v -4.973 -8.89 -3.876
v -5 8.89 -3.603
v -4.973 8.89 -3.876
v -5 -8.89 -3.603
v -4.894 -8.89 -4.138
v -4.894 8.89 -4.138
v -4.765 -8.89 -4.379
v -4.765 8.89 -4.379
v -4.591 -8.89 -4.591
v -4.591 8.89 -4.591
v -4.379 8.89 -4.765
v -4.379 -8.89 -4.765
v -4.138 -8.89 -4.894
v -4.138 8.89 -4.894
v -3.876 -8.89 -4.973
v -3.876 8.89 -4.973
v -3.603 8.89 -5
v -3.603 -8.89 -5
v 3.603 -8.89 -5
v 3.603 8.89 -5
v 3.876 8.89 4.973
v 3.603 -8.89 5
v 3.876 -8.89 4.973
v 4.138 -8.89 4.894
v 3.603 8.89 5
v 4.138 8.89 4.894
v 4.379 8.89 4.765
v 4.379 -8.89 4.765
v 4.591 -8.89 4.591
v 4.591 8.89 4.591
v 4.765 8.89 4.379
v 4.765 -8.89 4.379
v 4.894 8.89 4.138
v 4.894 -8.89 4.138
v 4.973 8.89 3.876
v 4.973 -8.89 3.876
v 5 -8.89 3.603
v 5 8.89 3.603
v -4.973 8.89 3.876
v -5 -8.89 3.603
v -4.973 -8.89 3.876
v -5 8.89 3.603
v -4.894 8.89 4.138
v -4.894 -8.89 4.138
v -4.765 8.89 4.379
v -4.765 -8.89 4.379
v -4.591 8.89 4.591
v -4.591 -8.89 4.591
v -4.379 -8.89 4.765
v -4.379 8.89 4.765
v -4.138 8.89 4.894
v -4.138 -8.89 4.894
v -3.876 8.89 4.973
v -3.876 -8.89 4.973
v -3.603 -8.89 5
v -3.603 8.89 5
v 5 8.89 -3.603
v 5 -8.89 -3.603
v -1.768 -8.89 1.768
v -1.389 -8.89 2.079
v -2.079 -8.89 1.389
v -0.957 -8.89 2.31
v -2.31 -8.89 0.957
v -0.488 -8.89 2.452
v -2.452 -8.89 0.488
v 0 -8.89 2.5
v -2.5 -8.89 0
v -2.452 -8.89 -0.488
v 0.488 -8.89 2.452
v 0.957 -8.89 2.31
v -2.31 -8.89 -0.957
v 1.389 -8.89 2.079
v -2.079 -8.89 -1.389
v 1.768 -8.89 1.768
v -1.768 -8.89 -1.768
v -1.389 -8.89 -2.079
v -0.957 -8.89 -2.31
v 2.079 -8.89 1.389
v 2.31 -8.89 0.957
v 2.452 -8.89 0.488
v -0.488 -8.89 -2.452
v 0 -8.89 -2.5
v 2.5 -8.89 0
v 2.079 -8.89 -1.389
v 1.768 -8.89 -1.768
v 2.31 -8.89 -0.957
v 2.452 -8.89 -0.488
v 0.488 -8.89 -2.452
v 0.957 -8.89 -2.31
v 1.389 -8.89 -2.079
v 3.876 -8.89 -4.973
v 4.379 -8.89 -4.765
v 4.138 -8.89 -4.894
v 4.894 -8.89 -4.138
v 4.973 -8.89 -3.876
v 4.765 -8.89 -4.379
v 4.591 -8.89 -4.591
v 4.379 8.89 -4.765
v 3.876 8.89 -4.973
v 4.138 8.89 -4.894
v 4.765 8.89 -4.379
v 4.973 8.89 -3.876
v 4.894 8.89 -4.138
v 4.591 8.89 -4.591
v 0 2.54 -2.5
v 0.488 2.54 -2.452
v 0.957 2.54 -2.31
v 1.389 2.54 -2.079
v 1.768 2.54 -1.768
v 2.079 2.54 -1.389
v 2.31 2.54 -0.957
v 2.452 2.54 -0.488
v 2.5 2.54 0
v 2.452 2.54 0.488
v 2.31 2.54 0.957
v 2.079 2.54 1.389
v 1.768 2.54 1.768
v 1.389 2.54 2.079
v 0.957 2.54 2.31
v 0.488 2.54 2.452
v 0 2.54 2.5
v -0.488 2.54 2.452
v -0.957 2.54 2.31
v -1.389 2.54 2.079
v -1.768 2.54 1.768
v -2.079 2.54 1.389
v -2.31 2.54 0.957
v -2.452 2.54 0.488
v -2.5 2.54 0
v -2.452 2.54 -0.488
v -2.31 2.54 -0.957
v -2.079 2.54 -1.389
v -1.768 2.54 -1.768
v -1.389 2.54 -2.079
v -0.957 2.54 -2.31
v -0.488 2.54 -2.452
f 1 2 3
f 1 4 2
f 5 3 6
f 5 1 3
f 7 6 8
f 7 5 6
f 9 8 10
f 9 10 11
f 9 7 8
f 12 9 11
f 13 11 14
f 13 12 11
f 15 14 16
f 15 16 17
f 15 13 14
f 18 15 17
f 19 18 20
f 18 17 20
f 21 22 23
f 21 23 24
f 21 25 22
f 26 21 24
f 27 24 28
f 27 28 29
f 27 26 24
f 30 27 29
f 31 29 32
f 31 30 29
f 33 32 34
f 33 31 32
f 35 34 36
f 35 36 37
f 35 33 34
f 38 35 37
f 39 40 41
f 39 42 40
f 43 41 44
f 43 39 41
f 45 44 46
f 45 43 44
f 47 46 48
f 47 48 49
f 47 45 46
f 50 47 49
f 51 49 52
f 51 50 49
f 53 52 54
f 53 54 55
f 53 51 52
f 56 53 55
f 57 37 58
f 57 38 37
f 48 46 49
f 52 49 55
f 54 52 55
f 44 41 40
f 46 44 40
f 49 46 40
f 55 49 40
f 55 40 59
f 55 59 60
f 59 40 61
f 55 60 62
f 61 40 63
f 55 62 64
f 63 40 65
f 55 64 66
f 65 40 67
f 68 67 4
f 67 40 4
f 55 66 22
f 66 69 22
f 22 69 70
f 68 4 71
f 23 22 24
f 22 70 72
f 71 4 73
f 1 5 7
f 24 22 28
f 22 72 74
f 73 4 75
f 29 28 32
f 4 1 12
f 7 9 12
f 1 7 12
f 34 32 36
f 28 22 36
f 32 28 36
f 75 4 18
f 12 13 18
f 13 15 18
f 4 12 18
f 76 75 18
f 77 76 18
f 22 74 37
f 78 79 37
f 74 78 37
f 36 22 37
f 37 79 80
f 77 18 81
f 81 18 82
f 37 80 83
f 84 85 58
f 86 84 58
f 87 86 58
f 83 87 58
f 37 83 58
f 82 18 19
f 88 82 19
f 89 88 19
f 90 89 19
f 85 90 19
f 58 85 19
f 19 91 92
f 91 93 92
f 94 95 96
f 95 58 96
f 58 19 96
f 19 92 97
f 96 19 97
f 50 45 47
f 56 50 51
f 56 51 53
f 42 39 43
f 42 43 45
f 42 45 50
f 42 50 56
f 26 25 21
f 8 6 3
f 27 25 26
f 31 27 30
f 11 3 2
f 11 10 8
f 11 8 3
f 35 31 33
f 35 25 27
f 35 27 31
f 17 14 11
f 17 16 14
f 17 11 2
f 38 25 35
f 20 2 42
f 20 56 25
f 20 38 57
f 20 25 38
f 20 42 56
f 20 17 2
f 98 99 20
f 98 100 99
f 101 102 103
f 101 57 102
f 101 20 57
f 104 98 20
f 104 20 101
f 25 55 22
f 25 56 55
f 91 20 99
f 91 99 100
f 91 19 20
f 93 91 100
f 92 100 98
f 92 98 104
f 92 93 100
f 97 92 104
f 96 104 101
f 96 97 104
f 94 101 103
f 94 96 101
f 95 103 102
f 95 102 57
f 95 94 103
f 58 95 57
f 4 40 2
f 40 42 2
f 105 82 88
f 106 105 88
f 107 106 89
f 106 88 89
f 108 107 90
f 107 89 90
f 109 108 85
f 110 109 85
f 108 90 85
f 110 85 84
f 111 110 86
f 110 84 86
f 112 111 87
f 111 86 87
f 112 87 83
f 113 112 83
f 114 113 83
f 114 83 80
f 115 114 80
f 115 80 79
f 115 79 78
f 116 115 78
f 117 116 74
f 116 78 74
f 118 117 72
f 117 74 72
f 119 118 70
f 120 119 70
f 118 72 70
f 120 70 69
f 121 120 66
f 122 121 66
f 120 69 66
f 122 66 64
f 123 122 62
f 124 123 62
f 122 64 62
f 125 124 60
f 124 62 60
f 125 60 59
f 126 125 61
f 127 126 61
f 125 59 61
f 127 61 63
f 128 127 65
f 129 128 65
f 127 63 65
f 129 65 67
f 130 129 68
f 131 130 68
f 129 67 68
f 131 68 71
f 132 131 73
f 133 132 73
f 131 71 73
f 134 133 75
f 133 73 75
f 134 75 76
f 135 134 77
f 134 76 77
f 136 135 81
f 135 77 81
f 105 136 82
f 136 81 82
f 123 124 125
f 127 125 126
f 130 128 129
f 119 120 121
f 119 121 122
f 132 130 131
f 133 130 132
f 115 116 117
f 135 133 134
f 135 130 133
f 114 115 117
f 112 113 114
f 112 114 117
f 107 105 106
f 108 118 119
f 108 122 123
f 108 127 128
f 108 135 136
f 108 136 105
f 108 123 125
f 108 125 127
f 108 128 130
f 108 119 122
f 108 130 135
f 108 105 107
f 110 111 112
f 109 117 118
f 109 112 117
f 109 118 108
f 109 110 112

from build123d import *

# Parameters (mm, degrees)
SKETCH1_W           = 10
SKETCH1_H           = 10
BOSS_EXTRUDE1_DEPTH = 8.89
SKETCH2_R           = 2.5
CUT_EXTRUDE1_DEPTH  = 11.43
FILLET1_R           = 1.397


with BuildPart() as part:
    # Sketch1 → Boss-Extrude1 (new, symmetric)
    with BuildSketch(Plane(origin=(0, 0, 0), x_dir=(1, 0, 0), z_dir=(0, 1, 0))):
        Rectangle(SKETCH1_W, SKETCH1_H)
    extrude(amount=BOSS_EXTRUDE1_DEPTH, both=True)

    # Sketch2 → Cut-Extrude1 (cut)
    with BuildSketch(Plane.XZ.offset(8.89)):
        with Locations(Location((0, 0, 0), (0, 0, 270))):
            Circle(SKETCH2_R)
    extrude(amount=-CUT_EXTRUDE1_DEPTH, mode=Mode.SUBTRACT)

    # Fillet1
    fillet1_edges = [part.edges().sort_by_distance(p)[0] for p in [
        (5, 0, -5),
        (5, 0, 5),
        (-5, 0, 5),
        (-5, 0, -5),
    ]]
    fillet(fillet1_edges, radius=FILLET1_R)


solid = part.part
